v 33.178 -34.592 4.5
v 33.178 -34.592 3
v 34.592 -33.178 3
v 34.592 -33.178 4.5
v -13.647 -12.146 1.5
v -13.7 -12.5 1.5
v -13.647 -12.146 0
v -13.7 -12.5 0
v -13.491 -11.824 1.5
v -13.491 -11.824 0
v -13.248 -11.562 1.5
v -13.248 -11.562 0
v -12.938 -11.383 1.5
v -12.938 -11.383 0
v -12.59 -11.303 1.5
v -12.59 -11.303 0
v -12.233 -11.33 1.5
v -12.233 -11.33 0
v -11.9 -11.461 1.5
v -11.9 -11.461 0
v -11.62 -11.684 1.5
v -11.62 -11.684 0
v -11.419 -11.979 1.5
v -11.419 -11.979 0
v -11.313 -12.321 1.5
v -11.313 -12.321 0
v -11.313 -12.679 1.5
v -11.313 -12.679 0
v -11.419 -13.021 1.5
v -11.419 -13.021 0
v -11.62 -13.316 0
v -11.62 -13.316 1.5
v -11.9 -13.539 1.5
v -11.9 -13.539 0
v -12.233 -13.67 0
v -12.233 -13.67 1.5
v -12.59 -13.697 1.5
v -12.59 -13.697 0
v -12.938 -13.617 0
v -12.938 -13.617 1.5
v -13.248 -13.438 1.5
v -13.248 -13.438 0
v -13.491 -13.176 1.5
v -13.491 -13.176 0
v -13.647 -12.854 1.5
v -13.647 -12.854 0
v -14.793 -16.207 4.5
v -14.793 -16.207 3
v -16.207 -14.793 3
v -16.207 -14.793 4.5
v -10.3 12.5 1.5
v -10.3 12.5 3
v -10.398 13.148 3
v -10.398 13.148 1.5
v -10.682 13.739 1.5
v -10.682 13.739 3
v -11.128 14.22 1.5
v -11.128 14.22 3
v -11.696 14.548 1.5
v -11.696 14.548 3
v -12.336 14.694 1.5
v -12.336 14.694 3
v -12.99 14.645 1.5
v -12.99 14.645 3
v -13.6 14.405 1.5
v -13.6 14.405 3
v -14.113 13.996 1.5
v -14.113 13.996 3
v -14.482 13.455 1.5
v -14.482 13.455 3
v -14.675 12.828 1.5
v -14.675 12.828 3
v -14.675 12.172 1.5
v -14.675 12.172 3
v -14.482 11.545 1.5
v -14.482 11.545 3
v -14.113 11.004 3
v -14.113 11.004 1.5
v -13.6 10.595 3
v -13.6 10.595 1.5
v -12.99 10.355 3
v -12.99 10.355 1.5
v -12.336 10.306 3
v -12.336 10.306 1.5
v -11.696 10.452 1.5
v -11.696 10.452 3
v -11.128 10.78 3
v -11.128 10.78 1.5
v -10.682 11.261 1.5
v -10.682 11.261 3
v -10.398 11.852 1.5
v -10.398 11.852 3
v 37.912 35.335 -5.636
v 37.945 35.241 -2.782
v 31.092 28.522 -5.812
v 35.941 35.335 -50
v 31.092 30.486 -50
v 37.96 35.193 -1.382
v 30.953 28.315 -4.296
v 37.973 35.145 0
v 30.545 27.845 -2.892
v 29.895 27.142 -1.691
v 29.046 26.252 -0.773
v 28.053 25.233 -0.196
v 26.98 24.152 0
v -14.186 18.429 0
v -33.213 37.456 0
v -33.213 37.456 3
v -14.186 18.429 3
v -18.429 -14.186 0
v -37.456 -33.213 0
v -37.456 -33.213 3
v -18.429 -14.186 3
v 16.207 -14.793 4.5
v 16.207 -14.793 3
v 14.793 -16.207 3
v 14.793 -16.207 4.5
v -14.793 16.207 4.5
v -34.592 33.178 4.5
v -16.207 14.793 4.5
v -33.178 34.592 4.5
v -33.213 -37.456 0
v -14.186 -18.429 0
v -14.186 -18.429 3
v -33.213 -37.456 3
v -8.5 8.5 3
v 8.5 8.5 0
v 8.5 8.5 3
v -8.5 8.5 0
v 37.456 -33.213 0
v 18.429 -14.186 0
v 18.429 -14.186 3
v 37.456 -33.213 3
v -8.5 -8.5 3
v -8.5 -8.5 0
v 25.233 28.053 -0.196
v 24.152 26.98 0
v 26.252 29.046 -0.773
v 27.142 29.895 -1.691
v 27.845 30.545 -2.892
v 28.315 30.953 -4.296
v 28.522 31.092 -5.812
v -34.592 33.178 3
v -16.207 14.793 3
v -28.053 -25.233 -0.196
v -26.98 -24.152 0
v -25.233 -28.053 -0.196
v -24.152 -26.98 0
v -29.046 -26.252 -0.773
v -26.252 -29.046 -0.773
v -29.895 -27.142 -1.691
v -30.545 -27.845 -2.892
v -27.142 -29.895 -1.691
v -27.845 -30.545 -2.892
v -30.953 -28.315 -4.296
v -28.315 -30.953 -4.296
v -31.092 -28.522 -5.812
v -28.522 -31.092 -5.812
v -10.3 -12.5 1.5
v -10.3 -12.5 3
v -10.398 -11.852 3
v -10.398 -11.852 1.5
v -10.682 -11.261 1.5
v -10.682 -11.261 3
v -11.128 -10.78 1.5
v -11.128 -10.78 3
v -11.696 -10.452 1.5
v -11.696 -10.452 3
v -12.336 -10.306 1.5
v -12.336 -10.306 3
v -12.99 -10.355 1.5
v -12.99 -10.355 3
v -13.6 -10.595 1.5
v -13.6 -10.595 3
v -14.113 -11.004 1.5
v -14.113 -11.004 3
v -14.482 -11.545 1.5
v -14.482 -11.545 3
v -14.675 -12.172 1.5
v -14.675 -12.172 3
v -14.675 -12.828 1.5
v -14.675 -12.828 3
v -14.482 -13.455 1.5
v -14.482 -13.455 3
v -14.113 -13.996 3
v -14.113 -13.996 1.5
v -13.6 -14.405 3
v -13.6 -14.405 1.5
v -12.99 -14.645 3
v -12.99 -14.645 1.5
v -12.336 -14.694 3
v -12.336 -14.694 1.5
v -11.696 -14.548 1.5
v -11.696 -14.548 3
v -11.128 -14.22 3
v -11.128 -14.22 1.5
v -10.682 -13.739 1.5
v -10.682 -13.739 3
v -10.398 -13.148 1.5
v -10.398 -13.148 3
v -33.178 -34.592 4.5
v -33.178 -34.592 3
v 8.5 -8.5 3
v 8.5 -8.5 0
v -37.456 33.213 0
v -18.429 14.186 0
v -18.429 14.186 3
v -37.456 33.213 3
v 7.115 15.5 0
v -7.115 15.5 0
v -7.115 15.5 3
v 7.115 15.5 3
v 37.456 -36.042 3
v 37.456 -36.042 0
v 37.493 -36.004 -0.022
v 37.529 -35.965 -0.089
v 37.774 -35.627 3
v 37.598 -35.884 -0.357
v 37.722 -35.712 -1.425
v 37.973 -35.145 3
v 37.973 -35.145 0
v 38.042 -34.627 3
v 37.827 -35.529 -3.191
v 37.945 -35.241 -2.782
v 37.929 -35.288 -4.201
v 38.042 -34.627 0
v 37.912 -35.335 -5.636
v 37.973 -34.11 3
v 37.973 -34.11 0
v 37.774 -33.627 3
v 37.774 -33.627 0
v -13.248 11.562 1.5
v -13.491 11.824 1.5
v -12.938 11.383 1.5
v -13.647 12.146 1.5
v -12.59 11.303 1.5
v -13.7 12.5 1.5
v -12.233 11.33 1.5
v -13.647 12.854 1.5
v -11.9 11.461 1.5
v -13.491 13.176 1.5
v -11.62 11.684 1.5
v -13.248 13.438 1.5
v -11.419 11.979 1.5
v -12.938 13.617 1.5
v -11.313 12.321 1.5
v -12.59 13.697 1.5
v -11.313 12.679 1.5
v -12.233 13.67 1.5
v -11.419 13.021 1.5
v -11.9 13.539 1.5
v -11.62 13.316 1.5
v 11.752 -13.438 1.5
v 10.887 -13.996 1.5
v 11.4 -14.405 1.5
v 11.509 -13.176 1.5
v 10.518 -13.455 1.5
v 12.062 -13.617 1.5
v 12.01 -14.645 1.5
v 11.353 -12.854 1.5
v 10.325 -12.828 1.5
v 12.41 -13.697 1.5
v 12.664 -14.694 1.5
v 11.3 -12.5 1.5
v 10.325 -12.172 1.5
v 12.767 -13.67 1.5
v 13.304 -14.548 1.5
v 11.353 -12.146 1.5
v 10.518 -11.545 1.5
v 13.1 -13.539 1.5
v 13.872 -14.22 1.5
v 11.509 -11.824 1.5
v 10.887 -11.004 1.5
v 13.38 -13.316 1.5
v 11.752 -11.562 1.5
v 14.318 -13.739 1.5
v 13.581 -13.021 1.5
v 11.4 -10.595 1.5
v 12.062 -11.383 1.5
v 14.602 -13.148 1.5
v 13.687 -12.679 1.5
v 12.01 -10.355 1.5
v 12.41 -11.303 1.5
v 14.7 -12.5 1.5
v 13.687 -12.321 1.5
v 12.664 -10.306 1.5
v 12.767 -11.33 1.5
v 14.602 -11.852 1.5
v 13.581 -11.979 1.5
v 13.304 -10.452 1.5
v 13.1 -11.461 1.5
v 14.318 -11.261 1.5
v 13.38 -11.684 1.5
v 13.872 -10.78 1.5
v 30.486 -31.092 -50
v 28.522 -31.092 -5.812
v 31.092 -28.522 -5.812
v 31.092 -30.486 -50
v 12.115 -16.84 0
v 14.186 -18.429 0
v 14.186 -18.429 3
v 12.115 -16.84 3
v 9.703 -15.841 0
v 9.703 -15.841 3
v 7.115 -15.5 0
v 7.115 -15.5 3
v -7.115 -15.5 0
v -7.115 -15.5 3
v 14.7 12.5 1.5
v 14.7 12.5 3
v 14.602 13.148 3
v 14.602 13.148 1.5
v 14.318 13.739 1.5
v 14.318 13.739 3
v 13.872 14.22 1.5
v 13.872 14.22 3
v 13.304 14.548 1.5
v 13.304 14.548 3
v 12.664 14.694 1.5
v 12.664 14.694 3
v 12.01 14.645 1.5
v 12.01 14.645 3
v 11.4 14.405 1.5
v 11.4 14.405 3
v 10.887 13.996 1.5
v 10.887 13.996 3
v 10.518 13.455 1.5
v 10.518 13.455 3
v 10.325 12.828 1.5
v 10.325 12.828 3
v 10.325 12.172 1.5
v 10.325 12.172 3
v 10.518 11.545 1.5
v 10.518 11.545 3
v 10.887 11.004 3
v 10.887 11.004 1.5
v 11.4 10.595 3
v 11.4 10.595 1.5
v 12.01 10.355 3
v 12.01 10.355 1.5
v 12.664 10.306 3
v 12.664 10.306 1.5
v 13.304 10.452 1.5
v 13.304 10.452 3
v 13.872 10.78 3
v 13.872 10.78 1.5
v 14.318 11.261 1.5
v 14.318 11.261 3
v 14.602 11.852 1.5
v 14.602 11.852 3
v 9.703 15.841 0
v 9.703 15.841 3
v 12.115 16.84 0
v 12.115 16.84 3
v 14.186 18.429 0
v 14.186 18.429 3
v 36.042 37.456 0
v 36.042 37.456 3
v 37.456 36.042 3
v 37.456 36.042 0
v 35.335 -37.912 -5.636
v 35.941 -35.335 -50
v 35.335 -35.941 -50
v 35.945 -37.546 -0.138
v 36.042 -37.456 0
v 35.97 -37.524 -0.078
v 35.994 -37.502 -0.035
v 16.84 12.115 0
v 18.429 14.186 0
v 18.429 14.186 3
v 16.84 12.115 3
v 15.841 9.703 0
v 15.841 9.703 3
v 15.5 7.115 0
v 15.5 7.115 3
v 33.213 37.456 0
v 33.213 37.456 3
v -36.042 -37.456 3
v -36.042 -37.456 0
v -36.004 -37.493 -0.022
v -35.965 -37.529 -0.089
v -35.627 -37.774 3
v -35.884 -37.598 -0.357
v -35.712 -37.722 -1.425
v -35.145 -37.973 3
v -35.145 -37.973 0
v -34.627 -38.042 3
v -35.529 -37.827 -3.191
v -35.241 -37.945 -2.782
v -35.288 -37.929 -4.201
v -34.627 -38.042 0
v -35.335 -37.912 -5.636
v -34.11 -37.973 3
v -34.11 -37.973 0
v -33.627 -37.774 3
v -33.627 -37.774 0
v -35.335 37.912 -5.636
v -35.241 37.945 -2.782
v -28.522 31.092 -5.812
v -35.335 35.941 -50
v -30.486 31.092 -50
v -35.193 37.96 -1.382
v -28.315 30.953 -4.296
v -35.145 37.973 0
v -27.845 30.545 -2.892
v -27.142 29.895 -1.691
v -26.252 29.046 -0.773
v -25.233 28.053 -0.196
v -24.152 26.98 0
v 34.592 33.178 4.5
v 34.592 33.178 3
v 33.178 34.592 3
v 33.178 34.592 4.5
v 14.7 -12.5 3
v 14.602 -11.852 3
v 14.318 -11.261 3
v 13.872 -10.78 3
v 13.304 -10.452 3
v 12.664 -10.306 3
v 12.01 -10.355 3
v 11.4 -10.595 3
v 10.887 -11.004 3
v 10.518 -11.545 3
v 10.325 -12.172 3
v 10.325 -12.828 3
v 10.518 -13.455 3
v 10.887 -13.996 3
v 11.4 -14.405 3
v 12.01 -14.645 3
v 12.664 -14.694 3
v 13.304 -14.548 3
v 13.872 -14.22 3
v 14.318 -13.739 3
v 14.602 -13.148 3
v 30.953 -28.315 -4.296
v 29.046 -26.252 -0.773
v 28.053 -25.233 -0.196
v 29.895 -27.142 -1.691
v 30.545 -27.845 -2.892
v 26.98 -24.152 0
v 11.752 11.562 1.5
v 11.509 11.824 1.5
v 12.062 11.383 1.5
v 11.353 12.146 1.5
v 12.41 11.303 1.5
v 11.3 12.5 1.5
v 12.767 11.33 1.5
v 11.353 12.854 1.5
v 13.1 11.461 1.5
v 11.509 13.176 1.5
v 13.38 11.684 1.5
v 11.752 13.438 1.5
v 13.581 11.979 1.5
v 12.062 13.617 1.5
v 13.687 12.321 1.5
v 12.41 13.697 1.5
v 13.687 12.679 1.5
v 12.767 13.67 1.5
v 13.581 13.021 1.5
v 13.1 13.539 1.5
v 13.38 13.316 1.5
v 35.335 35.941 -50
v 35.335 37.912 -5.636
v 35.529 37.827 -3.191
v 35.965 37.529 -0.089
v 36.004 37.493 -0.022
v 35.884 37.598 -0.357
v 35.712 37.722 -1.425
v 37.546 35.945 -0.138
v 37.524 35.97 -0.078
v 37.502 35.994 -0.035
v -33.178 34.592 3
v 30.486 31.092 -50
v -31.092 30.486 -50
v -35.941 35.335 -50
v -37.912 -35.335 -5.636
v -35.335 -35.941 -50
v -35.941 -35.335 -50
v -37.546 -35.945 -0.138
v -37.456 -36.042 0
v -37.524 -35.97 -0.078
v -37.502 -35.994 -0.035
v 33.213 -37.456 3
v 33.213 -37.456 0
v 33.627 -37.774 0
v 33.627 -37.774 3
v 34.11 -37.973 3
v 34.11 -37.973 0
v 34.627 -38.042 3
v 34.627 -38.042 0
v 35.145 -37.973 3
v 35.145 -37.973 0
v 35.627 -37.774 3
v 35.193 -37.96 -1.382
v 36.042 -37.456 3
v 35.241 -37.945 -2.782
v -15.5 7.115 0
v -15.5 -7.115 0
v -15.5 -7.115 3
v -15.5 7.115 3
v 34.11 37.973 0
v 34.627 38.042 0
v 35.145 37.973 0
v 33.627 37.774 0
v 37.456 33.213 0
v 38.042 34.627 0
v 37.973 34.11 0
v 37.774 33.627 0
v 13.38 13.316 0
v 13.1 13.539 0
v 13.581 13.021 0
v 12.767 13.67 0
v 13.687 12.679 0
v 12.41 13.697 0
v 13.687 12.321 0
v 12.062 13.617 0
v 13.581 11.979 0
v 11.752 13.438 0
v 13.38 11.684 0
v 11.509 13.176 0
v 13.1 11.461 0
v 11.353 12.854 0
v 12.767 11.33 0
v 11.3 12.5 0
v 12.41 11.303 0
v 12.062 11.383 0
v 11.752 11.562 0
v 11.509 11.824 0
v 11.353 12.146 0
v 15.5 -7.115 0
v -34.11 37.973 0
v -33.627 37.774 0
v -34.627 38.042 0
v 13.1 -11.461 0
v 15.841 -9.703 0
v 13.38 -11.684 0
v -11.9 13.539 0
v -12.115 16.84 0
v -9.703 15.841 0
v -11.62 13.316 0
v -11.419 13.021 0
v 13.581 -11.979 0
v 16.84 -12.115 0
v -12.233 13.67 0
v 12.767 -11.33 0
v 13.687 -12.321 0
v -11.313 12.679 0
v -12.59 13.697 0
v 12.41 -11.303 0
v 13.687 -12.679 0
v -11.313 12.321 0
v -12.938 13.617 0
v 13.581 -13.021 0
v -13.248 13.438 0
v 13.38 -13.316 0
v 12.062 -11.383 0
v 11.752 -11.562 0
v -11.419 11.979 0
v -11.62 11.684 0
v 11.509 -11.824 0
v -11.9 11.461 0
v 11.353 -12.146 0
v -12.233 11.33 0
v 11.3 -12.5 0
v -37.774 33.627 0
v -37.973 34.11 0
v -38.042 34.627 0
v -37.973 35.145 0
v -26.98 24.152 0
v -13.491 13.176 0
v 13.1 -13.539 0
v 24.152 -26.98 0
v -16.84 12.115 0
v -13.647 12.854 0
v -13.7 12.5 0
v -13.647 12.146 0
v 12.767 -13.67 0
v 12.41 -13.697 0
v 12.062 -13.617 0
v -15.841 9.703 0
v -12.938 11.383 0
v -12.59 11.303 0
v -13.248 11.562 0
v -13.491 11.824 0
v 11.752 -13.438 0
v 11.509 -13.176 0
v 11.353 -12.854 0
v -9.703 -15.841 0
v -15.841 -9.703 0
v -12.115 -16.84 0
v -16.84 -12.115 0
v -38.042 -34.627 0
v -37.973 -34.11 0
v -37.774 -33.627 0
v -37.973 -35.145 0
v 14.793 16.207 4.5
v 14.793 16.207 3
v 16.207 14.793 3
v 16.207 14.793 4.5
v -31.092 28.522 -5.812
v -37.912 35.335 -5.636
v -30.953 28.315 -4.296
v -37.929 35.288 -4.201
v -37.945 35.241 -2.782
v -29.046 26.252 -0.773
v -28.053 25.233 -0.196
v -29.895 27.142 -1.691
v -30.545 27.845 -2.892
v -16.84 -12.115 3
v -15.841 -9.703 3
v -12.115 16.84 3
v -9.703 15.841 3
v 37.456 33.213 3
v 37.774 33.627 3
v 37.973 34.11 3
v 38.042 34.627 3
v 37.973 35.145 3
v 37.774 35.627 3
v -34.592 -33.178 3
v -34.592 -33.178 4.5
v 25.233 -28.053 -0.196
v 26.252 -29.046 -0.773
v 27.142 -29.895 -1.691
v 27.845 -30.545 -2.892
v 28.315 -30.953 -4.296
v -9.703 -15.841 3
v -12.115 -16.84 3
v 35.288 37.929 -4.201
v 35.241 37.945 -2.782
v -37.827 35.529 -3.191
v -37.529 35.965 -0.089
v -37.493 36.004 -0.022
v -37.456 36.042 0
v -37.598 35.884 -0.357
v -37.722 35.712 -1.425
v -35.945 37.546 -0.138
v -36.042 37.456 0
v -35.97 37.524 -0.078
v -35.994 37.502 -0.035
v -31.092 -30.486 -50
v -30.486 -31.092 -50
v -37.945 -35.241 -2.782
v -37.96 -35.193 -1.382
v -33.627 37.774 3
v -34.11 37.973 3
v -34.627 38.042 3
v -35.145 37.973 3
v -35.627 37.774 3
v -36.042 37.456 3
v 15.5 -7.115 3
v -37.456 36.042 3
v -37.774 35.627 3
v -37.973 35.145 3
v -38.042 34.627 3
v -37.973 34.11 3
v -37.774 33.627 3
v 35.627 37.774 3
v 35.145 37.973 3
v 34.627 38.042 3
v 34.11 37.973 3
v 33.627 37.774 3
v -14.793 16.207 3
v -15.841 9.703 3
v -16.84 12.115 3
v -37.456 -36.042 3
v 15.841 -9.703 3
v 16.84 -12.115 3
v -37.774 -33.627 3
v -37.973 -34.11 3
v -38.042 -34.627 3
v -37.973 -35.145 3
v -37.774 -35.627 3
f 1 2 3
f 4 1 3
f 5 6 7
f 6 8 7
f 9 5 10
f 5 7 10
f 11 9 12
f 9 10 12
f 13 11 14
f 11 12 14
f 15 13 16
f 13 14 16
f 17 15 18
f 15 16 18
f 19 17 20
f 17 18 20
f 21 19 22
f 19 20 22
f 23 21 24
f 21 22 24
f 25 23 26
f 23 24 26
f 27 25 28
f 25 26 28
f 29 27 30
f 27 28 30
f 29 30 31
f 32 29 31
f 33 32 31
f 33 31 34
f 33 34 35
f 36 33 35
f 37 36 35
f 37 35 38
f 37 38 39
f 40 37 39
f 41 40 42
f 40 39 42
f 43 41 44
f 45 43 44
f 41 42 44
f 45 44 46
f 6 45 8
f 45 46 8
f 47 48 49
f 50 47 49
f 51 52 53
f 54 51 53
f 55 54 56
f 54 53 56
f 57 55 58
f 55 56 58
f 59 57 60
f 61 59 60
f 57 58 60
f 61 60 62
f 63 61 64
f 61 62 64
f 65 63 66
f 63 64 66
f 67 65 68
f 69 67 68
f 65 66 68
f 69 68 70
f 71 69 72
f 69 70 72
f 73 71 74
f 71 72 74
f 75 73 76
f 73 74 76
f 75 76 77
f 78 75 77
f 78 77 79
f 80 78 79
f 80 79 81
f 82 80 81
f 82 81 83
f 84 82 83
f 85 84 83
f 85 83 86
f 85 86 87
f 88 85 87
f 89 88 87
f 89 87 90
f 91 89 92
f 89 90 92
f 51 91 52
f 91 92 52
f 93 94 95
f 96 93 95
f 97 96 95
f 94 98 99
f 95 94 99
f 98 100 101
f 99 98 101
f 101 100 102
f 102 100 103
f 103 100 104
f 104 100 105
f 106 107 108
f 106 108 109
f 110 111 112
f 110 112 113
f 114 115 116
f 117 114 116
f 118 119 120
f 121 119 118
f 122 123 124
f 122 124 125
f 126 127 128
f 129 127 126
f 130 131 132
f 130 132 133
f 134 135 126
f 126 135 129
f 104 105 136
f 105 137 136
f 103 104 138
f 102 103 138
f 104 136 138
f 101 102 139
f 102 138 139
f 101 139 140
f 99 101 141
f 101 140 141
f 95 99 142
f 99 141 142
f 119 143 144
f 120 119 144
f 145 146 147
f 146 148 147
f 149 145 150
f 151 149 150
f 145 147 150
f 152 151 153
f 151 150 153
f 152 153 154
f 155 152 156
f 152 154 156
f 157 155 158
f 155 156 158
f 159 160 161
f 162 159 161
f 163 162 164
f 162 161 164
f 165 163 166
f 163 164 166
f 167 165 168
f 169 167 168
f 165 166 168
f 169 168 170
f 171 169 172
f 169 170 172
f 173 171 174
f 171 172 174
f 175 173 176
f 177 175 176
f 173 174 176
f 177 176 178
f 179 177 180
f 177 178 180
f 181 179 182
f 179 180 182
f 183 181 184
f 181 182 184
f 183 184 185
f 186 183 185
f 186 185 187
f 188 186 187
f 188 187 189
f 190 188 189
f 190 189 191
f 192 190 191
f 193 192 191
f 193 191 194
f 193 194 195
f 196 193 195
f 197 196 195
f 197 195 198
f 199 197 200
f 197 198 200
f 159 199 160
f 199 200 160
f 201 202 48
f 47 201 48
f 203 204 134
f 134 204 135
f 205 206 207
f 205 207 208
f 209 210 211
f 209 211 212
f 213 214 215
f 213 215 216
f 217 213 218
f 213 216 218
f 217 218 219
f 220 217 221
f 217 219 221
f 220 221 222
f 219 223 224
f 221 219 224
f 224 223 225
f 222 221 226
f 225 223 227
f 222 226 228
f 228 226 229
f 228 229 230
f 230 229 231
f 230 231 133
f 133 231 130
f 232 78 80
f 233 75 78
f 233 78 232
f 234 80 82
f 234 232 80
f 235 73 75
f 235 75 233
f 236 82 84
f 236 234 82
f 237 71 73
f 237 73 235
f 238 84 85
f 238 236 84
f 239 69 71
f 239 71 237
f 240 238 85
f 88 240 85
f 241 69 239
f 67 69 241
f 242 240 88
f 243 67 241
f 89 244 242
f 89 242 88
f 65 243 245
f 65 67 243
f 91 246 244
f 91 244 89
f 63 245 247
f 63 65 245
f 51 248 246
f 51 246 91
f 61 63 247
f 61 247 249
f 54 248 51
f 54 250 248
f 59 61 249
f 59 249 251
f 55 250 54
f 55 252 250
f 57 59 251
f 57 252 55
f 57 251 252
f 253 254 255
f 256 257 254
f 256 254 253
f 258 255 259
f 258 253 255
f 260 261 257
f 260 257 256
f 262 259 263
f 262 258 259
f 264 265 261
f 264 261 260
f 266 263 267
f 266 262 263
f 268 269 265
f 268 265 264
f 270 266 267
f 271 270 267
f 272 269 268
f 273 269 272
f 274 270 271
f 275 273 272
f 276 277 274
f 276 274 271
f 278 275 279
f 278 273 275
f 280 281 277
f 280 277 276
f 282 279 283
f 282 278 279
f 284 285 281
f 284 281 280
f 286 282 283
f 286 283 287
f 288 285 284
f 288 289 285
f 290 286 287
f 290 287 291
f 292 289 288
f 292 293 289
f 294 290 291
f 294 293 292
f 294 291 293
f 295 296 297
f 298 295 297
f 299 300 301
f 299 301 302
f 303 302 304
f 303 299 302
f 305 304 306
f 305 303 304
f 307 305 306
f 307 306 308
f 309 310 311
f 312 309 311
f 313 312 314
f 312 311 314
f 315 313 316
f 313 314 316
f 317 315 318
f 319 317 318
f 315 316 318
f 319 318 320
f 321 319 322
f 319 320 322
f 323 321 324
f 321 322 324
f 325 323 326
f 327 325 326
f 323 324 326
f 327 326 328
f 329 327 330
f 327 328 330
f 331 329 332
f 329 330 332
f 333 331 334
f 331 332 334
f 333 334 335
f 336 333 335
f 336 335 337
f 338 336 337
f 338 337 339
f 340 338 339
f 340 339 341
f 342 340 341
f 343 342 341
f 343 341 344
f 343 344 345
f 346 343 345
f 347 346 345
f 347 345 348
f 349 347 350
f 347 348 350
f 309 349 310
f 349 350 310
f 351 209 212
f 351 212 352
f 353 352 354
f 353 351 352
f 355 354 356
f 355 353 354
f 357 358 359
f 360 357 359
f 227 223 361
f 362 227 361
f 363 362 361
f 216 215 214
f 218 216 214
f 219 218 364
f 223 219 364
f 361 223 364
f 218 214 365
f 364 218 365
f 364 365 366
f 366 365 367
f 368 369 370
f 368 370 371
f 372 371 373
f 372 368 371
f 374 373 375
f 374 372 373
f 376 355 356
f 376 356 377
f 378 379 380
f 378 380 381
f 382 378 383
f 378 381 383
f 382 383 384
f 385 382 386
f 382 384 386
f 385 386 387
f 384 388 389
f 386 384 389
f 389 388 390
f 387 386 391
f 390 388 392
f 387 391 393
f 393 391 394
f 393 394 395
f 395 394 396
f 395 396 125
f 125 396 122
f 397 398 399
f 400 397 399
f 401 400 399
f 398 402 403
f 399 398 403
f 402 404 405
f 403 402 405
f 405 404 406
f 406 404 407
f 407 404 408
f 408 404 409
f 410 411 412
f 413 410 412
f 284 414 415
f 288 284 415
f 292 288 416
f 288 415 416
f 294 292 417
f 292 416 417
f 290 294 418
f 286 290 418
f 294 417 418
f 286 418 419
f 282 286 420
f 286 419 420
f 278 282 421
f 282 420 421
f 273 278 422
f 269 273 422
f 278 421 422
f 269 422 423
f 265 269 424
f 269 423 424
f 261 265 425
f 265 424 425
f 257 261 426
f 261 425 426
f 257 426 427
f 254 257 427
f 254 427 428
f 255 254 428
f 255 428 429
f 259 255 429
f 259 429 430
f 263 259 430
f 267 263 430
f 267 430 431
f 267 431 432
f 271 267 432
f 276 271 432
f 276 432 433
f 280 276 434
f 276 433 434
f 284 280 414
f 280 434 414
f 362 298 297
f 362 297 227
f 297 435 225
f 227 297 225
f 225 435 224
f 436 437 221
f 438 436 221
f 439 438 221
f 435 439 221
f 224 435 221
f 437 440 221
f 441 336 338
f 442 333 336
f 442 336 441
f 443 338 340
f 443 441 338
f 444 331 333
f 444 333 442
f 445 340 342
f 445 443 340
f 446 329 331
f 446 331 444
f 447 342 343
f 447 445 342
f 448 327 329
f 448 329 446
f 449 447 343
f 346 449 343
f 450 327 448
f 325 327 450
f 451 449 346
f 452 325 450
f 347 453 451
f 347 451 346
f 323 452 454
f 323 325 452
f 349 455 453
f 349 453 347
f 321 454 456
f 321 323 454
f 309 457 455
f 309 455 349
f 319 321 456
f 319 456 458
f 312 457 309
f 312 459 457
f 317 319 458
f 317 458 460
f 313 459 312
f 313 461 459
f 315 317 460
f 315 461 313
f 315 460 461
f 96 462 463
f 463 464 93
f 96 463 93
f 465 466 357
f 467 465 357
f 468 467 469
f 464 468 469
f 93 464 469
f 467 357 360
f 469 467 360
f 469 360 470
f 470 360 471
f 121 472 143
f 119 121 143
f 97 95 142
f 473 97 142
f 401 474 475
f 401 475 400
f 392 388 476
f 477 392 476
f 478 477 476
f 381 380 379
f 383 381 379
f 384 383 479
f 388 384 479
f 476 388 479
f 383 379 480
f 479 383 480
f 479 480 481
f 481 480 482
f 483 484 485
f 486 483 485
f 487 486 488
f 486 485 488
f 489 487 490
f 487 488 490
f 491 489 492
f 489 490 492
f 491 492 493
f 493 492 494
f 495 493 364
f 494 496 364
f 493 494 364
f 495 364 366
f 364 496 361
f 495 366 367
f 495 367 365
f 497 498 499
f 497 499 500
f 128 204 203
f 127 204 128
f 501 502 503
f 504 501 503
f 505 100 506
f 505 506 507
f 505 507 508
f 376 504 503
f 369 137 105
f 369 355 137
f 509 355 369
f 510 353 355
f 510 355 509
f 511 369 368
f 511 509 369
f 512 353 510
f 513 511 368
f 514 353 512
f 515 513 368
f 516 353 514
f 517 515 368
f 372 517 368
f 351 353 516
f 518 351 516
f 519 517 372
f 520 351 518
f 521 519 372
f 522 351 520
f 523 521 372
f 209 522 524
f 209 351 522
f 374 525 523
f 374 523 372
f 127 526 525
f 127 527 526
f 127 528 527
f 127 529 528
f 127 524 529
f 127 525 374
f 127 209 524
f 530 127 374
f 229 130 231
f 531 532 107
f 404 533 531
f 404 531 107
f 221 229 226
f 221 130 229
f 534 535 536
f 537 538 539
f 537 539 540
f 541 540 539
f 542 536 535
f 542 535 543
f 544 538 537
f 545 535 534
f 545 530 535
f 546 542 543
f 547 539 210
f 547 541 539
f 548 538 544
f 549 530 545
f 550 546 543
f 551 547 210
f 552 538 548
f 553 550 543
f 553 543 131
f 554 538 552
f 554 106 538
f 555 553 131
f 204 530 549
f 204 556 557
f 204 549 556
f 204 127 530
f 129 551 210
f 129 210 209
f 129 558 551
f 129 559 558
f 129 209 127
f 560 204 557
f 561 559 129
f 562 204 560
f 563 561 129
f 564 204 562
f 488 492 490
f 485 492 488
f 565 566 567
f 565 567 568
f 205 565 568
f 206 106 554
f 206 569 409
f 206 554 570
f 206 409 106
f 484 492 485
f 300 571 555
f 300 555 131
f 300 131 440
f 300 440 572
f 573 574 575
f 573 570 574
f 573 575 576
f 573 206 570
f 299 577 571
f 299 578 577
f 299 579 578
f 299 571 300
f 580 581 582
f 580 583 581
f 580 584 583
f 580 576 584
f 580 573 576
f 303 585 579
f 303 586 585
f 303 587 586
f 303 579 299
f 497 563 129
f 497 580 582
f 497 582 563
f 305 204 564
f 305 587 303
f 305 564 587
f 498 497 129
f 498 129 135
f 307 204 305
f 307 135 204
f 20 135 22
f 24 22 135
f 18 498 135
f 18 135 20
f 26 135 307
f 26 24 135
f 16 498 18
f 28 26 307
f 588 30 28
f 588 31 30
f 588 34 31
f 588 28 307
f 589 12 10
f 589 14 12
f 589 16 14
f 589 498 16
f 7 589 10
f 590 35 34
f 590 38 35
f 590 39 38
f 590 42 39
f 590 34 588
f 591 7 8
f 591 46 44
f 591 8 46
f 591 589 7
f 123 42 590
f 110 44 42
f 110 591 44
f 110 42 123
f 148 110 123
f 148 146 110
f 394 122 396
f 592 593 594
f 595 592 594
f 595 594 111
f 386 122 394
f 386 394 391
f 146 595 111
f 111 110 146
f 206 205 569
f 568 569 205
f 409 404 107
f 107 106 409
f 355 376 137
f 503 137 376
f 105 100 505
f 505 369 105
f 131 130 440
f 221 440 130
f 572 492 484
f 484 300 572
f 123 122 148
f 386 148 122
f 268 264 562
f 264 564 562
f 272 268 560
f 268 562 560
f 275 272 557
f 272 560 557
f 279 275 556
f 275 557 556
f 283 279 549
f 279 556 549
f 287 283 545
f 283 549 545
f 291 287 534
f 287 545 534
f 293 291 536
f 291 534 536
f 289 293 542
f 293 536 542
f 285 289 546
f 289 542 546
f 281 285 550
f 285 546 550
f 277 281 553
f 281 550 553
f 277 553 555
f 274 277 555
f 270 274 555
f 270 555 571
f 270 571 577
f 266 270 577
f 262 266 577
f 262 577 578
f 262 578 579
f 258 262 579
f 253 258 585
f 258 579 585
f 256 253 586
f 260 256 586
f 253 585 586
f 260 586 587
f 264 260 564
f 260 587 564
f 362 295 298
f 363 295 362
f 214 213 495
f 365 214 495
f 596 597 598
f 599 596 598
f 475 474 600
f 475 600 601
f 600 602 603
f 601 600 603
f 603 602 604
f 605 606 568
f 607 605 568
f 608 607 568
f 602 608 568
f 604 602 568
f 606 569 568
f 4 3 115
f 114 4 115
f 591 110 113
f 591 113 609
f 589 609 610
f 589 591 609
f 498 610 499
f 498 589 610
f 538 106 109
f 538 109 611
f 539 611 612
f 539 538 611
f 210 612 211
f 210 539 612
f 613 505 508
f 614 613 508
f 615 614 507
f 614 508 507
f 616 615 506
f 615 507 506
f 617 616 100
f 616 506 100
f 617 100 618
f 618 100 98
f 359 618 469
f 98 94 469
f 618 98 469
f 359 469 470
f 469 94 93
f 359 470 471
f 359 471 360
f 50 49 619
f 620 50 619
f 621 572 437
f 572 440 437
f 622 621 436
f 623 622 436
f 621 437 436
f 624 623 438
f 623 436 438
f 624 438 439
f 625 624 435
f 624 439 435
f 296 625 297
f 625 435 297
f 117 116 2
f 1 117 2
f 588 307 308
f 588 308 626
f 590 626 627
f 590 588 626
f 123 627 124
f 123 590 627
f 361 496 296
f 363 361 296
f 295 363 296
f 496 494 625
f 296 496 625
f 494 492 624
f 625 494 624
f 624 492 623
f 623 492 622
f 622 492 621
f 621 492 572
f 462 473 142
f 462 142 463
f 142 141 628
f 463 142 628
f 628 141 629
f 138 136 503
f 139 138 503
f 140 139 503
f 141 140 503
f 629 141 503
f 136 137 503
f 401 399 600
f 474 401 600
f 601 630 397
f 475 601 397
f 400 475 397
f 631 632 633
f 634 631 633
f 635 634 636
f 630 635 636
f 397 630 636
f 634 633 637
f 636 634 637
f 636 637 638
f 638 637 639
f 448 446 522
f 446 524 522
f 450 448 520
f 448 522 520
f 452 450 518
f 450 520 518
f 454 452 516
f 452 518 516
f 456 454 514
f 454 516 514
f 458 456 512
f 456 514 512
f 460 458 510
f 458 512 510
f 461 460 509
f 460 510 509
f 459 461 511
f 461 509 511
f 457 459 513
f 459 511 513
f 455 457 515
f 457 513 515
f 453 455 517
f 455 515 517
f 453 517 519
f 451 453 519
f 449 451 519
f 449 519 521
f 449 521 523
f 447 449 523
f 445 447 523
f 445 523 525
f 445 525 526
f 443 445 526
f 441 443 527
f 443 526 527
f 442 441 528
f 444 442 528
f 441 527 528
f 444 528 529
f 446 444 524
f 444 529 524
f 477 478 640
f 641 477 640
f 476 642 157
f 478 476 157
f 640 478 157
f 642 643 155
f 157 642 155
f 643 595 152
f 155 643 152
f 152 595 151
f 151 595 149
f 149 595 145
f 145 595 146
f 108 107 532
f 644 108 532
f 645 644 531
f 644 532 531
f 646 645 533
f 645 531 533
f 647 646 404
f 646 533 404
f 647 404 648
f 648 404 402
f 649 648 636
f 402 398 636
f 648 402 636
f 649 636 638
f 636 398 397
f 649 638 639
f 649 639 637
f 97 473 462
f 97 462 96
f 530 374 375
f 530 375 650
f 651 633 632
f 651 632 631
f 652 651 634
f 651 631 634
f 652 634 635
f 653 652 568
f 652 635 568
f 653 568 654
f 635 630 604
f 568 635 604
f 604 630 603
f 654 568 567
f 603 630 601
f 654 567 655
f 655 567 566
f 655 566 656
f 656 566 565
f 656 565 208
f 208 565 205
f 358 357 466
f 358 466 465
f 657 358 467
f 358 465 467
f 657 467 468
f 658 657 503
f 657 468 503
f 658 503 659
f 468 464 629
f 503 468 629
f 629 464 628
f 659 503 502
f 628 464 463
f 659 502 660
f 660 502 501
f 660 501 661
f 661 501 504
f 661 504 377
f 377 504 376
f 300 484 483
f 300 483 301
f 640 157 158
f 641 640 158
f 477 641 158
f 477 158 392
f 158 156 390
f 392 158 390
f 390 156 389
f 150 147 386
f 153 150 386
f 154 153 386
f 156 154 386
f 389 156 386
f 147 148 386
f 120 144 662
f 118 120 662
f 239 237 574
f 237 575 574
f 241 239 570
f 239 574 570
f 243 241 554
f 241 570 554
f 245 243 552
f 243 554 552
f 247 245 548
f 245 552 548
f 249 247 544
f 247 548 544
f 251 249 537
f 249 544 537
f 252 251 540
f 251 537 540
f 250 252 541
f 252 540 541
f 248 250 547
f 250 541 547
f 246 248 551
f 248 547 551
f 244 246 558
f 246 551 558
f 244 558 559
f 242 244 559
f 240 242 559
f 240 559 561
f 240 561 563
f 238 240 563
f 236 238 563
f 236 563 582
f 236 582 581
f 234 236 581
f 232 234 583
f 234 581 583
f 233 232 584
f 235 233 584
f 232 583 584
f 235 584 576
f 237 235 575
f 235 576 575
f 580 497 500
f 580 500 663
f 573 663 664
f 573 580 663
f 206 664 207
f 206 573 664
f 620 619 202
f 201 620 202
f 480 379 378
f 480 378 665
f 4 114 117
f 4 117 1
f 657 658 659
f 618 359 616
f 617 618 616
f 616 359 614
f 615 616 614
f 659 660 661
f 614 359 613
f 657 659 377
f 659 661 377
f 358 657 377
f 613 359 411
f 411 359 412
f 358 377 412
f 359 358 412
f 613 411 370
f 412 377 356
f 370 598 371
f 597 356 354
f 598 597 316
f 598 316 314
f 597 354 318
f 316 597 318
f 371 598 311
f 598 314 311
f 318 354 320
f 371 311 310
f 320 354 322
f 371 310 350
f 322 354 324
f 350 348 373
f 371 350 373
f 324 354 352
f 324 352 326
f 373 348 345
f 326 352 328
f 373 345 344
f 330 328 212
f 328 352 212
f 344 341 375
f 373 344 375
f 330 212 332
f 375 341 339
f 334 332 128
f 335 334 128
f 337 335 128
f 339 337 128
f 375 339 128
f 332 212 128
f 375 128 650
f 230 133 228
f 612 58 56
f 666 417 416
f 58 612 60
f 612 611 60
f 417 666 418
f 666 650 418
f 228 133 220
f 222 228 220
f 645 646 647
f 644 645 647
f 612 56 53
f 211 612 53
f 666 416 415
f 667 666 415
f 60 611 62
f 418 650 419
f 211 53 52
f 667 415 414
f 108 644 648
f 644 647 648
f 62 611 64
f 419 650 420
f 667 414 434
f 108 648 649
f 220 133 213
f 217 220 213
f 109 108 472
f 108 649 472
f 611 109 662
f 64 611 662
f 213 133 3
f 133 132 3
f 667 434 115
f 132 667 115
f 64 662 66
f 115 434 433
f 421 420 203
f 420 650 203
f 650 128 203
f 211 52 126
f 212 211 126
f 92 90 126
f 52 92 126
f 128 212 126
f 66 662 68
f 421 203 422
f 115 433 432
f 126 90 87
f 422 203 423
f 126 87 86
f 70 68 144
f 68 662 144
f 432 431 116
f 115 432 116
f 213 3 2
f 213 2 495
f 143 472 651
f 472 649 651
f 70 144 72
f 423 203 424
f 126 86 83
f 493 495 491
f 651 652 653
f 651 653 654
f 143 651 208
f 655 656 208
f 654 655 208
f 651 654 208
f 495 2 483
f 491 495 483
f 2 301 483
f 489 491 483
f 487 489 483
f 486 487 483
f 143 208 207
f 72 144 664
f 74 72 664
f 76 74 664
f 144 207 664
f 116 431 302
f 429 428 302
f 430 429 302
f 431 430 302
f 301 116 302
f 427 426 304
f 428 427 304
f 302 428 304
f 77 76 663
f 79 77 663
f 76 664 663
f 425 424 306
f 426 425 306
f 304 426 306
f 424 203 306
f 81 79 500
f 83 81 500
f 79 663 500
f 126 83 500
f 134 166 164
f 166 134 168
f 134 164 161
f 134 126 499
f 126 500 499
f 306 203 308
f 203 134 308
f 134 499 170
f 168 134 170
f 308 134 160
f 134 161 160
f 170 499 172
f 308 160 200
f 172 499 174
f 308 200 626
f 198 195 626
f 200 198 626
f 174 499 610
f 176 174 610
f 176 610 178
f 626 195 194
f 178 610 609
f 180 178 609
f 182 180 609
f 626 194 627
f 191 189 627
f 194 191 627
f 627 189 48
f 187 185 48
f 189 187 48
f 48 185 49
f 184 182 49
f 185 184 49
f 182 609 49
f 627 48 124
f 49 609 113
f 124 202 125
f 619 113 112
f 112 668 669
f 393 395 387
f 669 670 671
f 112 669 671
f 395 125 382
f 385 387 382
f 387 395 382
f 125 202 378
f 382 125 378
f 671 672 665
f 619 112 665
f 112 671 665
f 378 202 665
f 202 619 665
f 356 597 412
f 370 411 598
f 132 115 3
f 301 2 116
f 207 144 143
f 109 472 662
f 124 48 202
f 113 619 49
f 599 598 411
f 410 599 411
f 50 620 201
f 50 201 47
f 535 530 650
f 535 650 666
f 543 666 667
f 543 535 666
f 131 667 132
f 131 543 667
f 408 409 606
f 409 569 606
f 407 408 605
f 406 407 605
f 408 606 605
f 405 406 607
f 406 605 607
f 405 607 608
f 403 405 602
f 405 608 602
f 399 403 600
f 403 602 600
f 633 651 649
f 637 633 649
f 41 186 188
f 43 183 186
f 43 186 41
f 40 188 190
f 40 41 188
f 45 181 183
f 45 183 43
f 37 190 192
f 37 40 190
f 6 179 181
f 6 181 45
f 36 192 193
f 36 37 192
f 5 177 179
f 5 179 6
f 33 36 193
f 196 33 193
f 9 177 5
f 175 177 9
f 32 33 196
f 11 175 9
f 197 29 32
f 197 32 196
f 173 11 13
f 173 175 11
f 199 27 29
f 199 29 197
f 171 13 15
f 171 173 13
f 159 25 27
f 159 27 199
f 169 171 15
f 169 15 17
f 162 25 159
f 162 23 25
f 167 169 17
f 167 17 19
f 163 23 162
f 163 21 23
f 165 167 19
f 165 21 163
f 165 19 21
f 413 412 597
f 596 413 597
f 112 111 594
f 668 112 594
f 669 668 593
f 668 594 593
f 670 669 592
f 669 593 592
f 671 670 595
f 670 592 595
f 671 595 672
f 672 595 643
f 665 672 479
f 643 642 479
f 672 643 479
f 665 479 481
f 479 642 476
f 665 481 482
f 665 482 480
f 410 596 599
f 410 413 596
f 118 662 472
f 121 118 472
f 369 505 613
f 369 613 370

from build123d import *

# Parameters (mm, degrees)
SKETCH2_W                      = 17
SKETCH2_H                      = 17
BOSS_EXTRUDE1_DEPTH            = 3
SKETCH3_R                      = 2.2
CUT_EXTRUDE1_DEPTH             = 1.5
M2_CLEARANCE_HOLE1_D           = 2.4
M2_CLEARANCE_HOLE1_CSINK_D     = 2.45
M2_CLEARANCE_HOLE1_CSINK_ANGLE = 90
BOSS_EXTRUDE2_DEPTH            = 50
BOSS_EXTRUDE2_DRAFT            = 1.8
BOSS_EXTRUDE2_PROFILE_2_DEPTH  = 50
BOSS_EXTRUDE2_PROFILE_2_DRAFT  = 1.8
BOSS_EXTRUDE2_PROFILE_3_DEPTH  = 50
BOSS_EXTRUDE2_PROFILE_3_DRAFT  = 1.8
BOSS_EXTRUDE2_PROFILE_4_DEPTH  = 50
BOSS_EXTRUDE2_PROFILE_4_DRAFT  = 1.8
FILLET1_R                      = 6
FILLET2_R                      = 2
BOSS_EXTRUDE3_DEPTH            = 1.5


with BuildPart() as part:
    # Sketch2 → Boss-Extrude1 (new body)
    with BuildSketch(Plane(origin=(0, 0, 0), x_dir=(0, 1, 0), z_dir=(0, 0, 1))):
        with BuildLine():
            Line((-38.870057685, 34.627416998), (-34.627416998, 38.870057685))
            Line((-34.627416998, 38.870057685), (-14.186291501, 18.428932188))
            ThreePointArc((-14.186291501, 18.428932188), (-10.942058013, 16.261204675), (-7.115223689, 15.5))
            Line((-7.115223689, 15.5), (7.115223689, 15.5))
            ThreePointArc((7.115223689, 15.5), (10.942058013, 16.261204675), (14.186291501, 18.428932188))
            Line((14.186291501, 18.428932188), (34.627416998, 38.870057685))
            Line((34.627416998, 38.870057685), (38.870057685, 34.627416998))
            Line((38.870057685, 34.627416998), (18.428932188, 14.186291501))
            ThreePointArc((18.428932188, 14.186291501), (16.261204675, 10.942058013), (15.5, 7.115223689))
            Line((15.5, 7.115223689), (15.5, -7.115223689))
            ThreePointArc((15.5, -7.115223689), (16.261204675, -10.942058013), (18.428932188, -14.186291501))
            Line((18.428932188, -14.186291501), (38.870057685, -34.627416998))
            Line((38.870057685, -34.627416998), (34.627416998, -38.870057685))
            Line((34.627416998, -38.870057685), (14.186291501, -18.428932188))
            ThreePointArc((14.186291501, -18.428932188), (10.942058013, -16.261204675), (7.115223689, -15.5))
            Line((7.115223689, -15.5), (-7.115223689, -15.5))
            ThreePointArc((-7.115223689, -15.5), (-10.942058013, -16.261204675), (-14.186291501, -18.428932188))
            Line((-14.186291501, -18.428932188), (-34.627416998, -38.870057685))
            Line((-34.627416998, -38.870057685), (-38.870057685, -34.627416998))
            Line((-38.870057685, -34.627416998), (-18.428932188, -14.186291501))
            ThreePointArc((-18.428932188, -14.186291501), (-16.261204675, -10.942058013), (-15.5, -7.115223689))
            Line((-15.5, -7.115223689), (-15.5, 7.115223689))
            ThreePointArc((-15.5, 7.115223689), (-16.261204675, 10.942058013), (-18.428932188, 14.186291501))
            Line((-18.428932188, 14.186291501), (-38.870057685, 34.627416998))
        make_face()
        Rectangle(SKETCH2_W, SKETCH2_H, mode=Mode.SUBTRACT)
    extrude(amount=BOSS_EXTRUDE1_DEPTH)

    # Sketch3 → Cut-Extrude1 (cut)
    with BuildSketch(Plane.XY.offset(3)):
        with Locations((-12.5, 12.5)):
            Circle(SKETCH3_R)
        with Locations((12.5, 12.5)):
            Circle(SKETCH3_R)
        with Locations((12.5, -12.5)):
            Circle(SKETCH3_R)
        with Locations((-12.5, -12.5)):
            Circle(SKETCH3_R)
    extrude(amount=-CUT_EXTRUDE1_DEPTH, mode=Mode.SUBTRACT)

    # M2 Clearance Hole1 (through all)
    with Locations(Plane.XY.offset(3)):
        with Locations((12.5, 12.5), (-12.5, -12.5), (-12.5, 12.5), (12.5, -12.5)):
            CounterSinkHole(M2_CLEARANCE_HOLE1_D / 2, M2_CLEARANCE_HOLE1_CSINK_D / 2, counter_sink_angle=M2_CLEARANCE_HOLE1_CSINK_ANGLE)


with BuildPart() as boss_extrude2_tool:
    # Sketch7 → Boss-Extrude2 (with draft: the straight prism first)
    with BuildSketch(Plane(origin=(0, 0, 0), x_dir=(1, 0, 0), z_dir=(0, 0, -1))):
        Polygon((28.263455967, 31.091883092), (31.091883092, 28.263455967), (38.162950904, 35.334523779), (35.334523779, 38.162950904), align=None)
    extrude(amount=BOSS_EXTRUDE2_DEPTH)
    # Boss-Extrude2: the draft: its side faces are tilted about the plane it starts from
    boss_extrude2_sides = [boss_extrude2_tool.faces().sort_by_distance(p)[0] for p in [
        (29.67766953, -29.67766953, -25),
        (34.627416998, -31.798989873, -25),
        (36.748737342, -36.748737342, -25),
        (31.798989873, -34.627416998, -25),
    ]]
    draft(boss_extrude2_sides, Plane(origin=(0, 0, 0), x_dir=(1, 0, 0), z_dir=(0, 0, -1)), BOSS_EXTRUDE2_DRAFT)


with BuildPart() as part_1:
    add(part.part)

    # Boss-Extrude2: add boss_extrude2_tool
    add(boss_extrude2_tool.part)


with BuildPart() as boss_extrude2_profile_2_tool:
    # Sketch7 → Boss-Extrude2 profile 2 (with draft: the straight prism first)
    with BuildSketch(Plane(origin=(0, 0, 0), x_dir=(1, 0, 0), z_dir=(0, 0, -1))):
        Polygon((31.091883092, -28.263455967), (28.263455967, -31.091883092), (35.334523779, -38.162950904), (38.162950904, -35.334523779), align=None)
    extrude(amount=BOSS_EXTRUDE2_PROFILE_2_DEPTH)
    # Boss-Extrude2 profile 2: the draft: its side faces are tilted about the plane it starts from
    boss_extrude2_profile_2_sides = [boss_extrude2_profile_2_tool.faces().sort_by_distance(p)[0] for p in [
        (29.67766953, 29.67766953, -25),
        (31.798989873, 34.627416998, -25),
        (36.748737342, 36.748737342, -25),
        (34.627416998, 31.798989873, -25),
    ]]
    draft(boss_extrude2_profile_2_sides, Plane(origin=(0, 0, 0), x_dir=(1, 0, 0), z_dir=(0, 0, -1)), BOSS_EXTRUDE2_PROFILE_2_DRAFT)


with BuildPart() as part_2:
    add(part_1.part)

    # Boss-Extrude2 profile 2: add boss_extrude2_profile_2_tool
    add(boss_extrude2_profile_2_tool.part)


with BuildPart() as boss_extrude2_profile_3_tool:
    # Sketch7 → Boss-Extrude2 profile 3 (with draft: the straight prism first)
    with BuildSketch(Plane(origin=(0, 0, 0), x_dir=(1, 0, 0), z_dir=(0, 0, -1))):
        Polygon((-28.263455967, -31.091883092), (-31.091883092, -28.263455967), (-38.162950904, -35.334523779), (-35.334523779, -38.162950904), align=None)
    extrude(amount=BOSS_EXTRUDE2_PROFILE_3_DEPTH)
    # Boss-Extrude2 profile 3: the draft: its side faces are tilted about the plane it starts from
    boss_extrude2_profile_3_sides = [boss_extrude2_profile_3_tool.faces().sort_by_distance(p)[0] for p in [
        (-29.67766953, 29.67766953, -25),
        (-34.627416998, 31.798989873, -25),
        (-36.748737342, 36.748737342, -25),
        (-31.798989873, 34.627416998, -25),
    ]]
    draft(boss_extrude2_profile_3_sides, Plane(origin=(0, 0, 0), x_dir=(1, 0, 0), z_dir=(0, 0, -1)), BOSS_EXTRUDE2_PROFILE_3_DRAFT)


with BuildPart() as part_3:
    add(part_2.part)

    # Boss-Extrude2 profile 3: add boss_extrude2_profile_3_tool
    add(boss_extrude2_profile_3_tool.part)


with BuildPart() as boss_extrude2_profile_4_tool:
    # Sketch7 → Boss-Extrude2 profile 4 (with draft: the straight prism first)
    with BuildSketch(Plane(origin=(0, 0, 0), x_dir=(1, 0, 0), z_dir=(0, 0, -1))):
        Polygon((-31.091883092, 28.263455967), (-28.263455967, 31.091883092), (-35.334523779, 38.162950904), (-38.162950904, 35.334523779), align=None)
    extrude(amount=BOSS_EXTRUDE2_PROFILE_4_DEPTH)
    # Boss-Extrude2 profile 4: the draft: its side faces are tilted about the plane it starts from
    boss_extrude2_profile_4_sides = [boss_extrude2_profile_4_tool.faces().sort_by_distance(p)[0] for p in [
        (-29.67766953, -29.67766953, -25),
        (-31.798989873, -34.627416998, -25),
        (-36.748737342, -36.748737342, -25),
        (-34.627416998, -31.798989873, -25),
    ]]
    draft(boss_extrude2_profile_4_sides, Plane(origin=(0, 0, 0), x_dir=(1, 0, 0), z_dir=(0, 0, -1)), BOSS_EXTRUDE2_PROFILE_4_DRAFT)


with BuildPart() as part_4:
    add(part_3.part)

    # Boss-Extrude2 profile 4: add boss_extrude2_profile_4_tool
    add(boss_extrude2_profile_4_tool.part)

    # Fillet1
    fillet1_edges = [part_4.edges().sort_by_distance(p)[0] for p in [
        (-29.67766953, -29.67766953, 0),
        (-29.67766953, 29.67766953, 0),
        (29.67766953, 29.67766953, 0),
        (29.67766953, -29.67766953, 0),
    ]]
    fillet(fillet1_edges, radius=FILLET1_R)

    # Fillet2
    # the kernel refuses this fillet: 2 mm, written as the material it takes off along each edge
    with BuildSketch(Plane(origin=(34.627416998, 38.870057685, -12), x_dir=(0.7071067811865476, -0.7071067811865476, 0), z_dir=(0, 0, 1)), Plane(origin=(38.870057685, 34.627416998, -12), x_dir=(-0.7071067811865476, -0.7071067811865476, 0), z_dir=(0, 0, 1)), Plane(origin=(38.870057685, -34.627416998, -12), x_dir=(-0.7071067811865476, -0.7071067811865476, 0), z_dir=(0, 0, 1)), Plane(origin=(34.627416998, -38.870057685, -12), x_dir=(-0.7071067811865476, 0.7071067811865476, 0), z_dir=(0, 0, 1)), Plane(origin=(-38.870057685, -34.627416998, -12), x_dir=(0.7071067811865476, 0.7071067811865476, 0), z_dir=(0, 0, 1)), Plane(origin=(-38.870057685, 34.627416998, -12), x_dir=(0.7071067811865476, 0.7071067811865476, 0), z_dir=(0, 0, 1)), Plane(origin=(-34.627416998, 38.870057685, -12), x_dir=(0.7071067811865476, -0.7071067811865476, 0), z_dir=(0, 0, 1))) as fillet2_piece_1:
        with BuildLine():
            CenterArc((FILLET2_R, -FILLET2_R), FILLET2_R, 90, 90)
            Line((0, -FILLET2_R), (-FILLET2_R * 0.02, -FILLET2_R))
            Line((-FILLET2_R * 0.02, -FILLET2_R), (-FILLET2_R * 0.02, FILLET2_R * 0.02))
            Line((-FILLET2_R * 0.02, FILLET2_R * 0.02), (FILLET2_R, FILLET2_R * 0.02))
            Line((FILLET2_R, FILLET2_R * 0.02), (FILLET2_R, 0))
        make_face()
    extrude(amount=27, mode=Mode.SUBTRACT)
    with BuildSketch(Plane(origin=(-34.627416998, -38.870057685, -12), x_dir=(0.7071067811865458, 0.7071067811865493, 0), z_dir=(0, 0, 1))) as fillet2_piece_2:
        with BuildLine():
            CenterArc((FILLET2_R, FILLET2_R), FILLET2_R, 180, 90)
            Line((0, FILLET2_R), (-FILLET2_R * 0.02, FILLET2_R))
            Line((-FILLET2_R * 0.02, FILLET2_R), (-FILLET2_R * 0.02, -FILLET2_R * 0.02))
            Line((-FILLET2_R * 0.02, -FILLET2_R * 0.02), (FILLET2_R, -FILLET2_R * 0.02))
            Line((FILLET2_R, -FILLET2_R * 0.02), (FILLET2_R, 0))
        make_face()
    extrude(amount=27, mode=Mode.SUBTRACT)

    # Sketch8 → Boss-Extrude3 (add)
    with BuildSketch(Plane.XY.offset(3)):
        Polygon((-16.207106781, 14.792893219), (-14.792893219, 16.207106781), (-33.17766953, 34.591883092), (-34.591883092, 33.17766953), align=None)
        Polygon((14.792893219, 16.207106781), (16.207106781, 14.792893219), (34.591883092, 33.17766953), (33.17766953, 34.591883092), align=None)
        Polygon((16.207106781, -14.792893219), (14.792893219, -16.207106781), (33.17766953, -34.591883092), (34.591883092, -33.17766953), align=None)
        Polygon((-14.792893219, -16.207106781), (-16.207106781, -14.792893219), (-34.591883092, -33.17766953), (-33.17766953, -34.591883092), align=None)
    extrude(amount=BOSS_EXTRUDE3_DEPTH)


solid = part_4.part
